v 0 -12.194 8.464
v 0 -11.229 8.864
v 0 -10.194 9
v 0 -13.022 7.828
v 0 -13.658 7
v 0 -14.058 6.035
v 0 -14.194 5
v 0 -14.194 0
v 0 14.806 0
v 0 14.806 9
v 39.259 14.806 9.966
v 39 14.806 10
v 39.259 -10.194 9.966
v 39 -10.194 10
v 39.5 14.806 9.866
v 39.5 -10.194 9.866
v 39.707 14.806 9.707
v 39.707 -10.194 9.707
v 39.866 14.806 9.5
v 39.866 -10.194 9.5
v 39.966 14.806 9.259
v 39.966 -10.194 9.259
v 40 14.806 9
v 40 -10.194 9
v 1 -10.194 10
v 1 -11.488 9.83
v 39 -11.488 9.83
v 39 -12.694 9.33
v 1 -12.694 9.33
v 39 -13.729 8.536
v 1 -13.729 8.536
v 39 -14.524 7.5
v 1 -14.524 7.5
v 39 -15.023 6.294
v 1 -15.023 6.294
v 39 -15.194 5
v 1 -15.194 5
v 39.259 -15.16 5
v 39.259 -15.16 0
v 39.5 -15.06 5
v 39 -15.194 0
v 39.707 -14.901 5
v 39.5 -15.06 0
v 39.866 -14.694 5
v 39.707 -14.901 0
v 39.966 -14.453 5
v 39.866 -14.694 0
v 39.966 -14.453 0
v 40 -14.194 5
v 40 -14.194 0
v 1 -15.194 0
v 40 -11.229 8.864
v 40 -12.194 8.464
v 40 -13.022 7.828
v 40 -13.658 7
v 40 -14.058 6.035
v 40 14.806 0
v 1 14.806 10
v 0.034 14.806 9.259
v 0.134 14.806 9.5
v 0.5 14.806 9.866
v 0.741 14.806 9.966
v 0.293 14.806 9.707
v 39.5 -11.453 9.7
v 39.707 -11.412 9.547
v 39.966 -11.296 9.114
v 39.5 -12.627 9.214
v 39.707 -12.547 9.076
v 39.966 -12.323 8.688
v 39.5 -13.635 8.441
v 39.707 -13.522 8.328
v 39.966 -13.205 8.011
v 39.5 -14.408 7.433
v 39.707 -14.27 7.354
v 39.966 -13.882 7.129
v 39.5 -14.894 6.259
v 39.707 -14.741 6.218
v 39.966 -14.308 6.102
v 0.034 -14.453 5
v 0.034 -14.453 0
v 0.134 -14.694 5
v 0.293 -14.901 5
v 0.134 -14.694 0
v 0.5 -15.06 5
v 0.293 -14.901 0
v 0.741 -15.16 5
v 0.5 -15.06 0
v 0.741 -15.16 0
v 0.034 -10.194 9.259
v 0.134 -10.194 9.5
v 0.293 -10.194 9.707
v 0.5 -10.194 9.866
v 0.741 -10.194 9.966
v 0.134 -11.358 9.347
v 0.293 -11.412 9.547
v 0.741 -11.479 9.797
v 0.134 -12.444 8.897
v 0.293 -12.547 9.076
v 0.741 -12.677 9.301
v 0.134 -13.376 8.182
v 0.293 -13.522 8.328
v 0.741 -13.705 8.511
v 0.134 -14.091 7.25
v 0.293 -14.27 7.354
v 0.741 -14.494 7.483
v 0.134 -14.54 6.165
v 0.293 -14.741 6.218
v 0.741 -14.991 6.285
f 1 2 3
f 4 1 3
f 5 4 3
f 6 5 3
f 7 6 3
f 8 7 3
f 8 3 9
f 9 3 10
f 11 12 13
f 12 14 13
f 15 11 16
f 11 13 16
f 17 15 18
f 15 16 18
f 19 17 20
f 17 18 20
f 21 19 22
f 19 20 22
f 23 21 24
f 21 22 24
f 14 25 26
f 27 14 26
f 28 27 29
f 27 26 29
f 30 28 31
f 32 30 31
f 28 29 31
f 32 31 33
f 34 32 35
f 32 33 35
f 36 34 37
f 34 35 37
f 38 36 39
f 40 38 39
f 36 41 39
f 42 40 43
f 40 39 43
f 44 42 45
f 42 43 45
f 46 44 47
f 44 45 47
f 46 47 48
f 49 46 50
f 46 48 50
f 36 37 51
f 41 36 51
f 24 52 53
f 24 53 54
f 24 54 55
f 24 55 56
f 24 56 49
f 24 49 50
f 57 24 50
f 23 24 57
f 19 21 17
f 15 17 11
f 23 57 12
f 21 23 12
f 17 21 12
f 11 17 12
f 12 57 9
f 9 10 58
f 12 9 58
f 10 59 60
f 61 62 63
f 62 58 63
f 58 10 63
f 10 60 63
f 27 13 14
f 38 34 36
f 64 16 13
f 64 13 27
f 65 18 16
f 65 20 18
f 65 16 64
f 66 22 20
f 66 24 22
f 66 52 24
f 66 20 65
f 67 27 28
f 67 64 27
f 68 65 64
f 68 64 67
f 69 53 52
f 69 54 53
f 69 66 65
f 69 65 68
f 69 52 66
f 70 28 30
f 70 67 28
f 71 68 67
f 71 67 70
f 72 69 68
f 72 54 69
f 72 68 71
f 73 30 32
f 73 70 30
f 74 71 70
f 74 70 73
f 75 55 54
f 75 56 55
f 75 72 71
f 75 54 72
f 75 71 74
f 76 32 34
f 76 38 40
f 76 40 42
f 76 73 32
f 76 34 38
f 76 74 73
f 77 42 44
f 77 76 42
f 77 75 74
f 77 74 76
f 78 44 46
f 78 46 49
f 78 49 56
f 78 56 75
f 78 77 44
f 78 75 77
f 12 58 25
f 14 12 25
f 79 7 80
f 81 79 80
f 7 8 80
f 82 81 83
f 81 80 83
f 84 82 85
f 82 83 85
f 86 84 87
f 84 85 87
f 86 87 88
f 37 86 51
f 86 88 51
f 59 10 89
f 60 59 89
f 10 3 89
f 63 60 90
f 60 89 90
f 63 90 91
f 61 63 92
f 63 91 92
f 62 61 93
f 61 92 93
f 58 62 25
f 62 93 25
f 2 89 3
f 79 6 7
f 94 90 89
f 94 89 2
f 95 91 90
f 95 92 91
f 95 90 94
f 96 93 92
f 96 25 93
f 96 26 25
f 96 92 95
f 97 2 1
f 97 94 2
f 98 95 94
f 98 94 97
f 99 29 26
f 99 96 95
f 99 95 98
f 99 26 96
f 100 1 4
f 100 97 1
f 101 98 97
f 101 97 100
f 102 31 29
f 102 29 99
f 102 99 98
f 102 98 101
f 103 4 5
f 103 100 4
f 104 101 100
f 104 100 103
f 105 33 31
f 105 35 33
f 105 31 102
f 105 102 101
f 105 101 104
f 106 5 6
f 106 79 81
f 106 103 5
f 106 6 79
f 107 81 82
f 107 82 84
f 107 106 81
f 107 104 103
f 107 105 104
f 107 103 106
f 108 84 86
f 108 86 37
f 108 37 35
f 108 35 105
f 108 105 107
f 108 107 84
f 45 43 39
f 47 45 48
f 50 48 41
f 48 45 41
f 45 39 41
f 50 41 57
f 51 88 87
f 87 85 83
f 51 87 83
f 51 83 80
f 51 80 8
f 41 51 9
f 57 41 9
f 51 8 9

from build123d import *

# Parameters (mm, degrees)
F1_DEPTH = 40
F2_R     = 1
F3_R     = 1


with BuildPart() as f1:
    # F0 (on Right) → F1 (new body)
    with BuildSketch(Plane.YZ):
        with BuildLine():
            Line((-15.193799, 5), (-15.193799, 0))
            Line((-15.193799, 0), (14.806201, 0))
            Line((14.806201, 0), (14.806201, 10))
            Line((14.806201, 10), (-10.193799, 10))
            ThreePointArc((-10.193799, 10), (-13.729333, 8.535534), (-15.193799, 5))
        make_face()
    extrude(amount=F1_DEPTH)

    # F2
    f2_edges = [f1.edges().sort_by_distance(p)[0] for p in [
        (40, 2.306201, 10),
    ]]
    fillet(f2_edges, radius=F2_R)

    # F3
    f3_edges = [f1.edges().sort_by_distance(p)[0] for p in [
        (0, 2.306201, 10),
    ]]
    fillet(f3_edges, radius=F3_R)


solid = f1.part
